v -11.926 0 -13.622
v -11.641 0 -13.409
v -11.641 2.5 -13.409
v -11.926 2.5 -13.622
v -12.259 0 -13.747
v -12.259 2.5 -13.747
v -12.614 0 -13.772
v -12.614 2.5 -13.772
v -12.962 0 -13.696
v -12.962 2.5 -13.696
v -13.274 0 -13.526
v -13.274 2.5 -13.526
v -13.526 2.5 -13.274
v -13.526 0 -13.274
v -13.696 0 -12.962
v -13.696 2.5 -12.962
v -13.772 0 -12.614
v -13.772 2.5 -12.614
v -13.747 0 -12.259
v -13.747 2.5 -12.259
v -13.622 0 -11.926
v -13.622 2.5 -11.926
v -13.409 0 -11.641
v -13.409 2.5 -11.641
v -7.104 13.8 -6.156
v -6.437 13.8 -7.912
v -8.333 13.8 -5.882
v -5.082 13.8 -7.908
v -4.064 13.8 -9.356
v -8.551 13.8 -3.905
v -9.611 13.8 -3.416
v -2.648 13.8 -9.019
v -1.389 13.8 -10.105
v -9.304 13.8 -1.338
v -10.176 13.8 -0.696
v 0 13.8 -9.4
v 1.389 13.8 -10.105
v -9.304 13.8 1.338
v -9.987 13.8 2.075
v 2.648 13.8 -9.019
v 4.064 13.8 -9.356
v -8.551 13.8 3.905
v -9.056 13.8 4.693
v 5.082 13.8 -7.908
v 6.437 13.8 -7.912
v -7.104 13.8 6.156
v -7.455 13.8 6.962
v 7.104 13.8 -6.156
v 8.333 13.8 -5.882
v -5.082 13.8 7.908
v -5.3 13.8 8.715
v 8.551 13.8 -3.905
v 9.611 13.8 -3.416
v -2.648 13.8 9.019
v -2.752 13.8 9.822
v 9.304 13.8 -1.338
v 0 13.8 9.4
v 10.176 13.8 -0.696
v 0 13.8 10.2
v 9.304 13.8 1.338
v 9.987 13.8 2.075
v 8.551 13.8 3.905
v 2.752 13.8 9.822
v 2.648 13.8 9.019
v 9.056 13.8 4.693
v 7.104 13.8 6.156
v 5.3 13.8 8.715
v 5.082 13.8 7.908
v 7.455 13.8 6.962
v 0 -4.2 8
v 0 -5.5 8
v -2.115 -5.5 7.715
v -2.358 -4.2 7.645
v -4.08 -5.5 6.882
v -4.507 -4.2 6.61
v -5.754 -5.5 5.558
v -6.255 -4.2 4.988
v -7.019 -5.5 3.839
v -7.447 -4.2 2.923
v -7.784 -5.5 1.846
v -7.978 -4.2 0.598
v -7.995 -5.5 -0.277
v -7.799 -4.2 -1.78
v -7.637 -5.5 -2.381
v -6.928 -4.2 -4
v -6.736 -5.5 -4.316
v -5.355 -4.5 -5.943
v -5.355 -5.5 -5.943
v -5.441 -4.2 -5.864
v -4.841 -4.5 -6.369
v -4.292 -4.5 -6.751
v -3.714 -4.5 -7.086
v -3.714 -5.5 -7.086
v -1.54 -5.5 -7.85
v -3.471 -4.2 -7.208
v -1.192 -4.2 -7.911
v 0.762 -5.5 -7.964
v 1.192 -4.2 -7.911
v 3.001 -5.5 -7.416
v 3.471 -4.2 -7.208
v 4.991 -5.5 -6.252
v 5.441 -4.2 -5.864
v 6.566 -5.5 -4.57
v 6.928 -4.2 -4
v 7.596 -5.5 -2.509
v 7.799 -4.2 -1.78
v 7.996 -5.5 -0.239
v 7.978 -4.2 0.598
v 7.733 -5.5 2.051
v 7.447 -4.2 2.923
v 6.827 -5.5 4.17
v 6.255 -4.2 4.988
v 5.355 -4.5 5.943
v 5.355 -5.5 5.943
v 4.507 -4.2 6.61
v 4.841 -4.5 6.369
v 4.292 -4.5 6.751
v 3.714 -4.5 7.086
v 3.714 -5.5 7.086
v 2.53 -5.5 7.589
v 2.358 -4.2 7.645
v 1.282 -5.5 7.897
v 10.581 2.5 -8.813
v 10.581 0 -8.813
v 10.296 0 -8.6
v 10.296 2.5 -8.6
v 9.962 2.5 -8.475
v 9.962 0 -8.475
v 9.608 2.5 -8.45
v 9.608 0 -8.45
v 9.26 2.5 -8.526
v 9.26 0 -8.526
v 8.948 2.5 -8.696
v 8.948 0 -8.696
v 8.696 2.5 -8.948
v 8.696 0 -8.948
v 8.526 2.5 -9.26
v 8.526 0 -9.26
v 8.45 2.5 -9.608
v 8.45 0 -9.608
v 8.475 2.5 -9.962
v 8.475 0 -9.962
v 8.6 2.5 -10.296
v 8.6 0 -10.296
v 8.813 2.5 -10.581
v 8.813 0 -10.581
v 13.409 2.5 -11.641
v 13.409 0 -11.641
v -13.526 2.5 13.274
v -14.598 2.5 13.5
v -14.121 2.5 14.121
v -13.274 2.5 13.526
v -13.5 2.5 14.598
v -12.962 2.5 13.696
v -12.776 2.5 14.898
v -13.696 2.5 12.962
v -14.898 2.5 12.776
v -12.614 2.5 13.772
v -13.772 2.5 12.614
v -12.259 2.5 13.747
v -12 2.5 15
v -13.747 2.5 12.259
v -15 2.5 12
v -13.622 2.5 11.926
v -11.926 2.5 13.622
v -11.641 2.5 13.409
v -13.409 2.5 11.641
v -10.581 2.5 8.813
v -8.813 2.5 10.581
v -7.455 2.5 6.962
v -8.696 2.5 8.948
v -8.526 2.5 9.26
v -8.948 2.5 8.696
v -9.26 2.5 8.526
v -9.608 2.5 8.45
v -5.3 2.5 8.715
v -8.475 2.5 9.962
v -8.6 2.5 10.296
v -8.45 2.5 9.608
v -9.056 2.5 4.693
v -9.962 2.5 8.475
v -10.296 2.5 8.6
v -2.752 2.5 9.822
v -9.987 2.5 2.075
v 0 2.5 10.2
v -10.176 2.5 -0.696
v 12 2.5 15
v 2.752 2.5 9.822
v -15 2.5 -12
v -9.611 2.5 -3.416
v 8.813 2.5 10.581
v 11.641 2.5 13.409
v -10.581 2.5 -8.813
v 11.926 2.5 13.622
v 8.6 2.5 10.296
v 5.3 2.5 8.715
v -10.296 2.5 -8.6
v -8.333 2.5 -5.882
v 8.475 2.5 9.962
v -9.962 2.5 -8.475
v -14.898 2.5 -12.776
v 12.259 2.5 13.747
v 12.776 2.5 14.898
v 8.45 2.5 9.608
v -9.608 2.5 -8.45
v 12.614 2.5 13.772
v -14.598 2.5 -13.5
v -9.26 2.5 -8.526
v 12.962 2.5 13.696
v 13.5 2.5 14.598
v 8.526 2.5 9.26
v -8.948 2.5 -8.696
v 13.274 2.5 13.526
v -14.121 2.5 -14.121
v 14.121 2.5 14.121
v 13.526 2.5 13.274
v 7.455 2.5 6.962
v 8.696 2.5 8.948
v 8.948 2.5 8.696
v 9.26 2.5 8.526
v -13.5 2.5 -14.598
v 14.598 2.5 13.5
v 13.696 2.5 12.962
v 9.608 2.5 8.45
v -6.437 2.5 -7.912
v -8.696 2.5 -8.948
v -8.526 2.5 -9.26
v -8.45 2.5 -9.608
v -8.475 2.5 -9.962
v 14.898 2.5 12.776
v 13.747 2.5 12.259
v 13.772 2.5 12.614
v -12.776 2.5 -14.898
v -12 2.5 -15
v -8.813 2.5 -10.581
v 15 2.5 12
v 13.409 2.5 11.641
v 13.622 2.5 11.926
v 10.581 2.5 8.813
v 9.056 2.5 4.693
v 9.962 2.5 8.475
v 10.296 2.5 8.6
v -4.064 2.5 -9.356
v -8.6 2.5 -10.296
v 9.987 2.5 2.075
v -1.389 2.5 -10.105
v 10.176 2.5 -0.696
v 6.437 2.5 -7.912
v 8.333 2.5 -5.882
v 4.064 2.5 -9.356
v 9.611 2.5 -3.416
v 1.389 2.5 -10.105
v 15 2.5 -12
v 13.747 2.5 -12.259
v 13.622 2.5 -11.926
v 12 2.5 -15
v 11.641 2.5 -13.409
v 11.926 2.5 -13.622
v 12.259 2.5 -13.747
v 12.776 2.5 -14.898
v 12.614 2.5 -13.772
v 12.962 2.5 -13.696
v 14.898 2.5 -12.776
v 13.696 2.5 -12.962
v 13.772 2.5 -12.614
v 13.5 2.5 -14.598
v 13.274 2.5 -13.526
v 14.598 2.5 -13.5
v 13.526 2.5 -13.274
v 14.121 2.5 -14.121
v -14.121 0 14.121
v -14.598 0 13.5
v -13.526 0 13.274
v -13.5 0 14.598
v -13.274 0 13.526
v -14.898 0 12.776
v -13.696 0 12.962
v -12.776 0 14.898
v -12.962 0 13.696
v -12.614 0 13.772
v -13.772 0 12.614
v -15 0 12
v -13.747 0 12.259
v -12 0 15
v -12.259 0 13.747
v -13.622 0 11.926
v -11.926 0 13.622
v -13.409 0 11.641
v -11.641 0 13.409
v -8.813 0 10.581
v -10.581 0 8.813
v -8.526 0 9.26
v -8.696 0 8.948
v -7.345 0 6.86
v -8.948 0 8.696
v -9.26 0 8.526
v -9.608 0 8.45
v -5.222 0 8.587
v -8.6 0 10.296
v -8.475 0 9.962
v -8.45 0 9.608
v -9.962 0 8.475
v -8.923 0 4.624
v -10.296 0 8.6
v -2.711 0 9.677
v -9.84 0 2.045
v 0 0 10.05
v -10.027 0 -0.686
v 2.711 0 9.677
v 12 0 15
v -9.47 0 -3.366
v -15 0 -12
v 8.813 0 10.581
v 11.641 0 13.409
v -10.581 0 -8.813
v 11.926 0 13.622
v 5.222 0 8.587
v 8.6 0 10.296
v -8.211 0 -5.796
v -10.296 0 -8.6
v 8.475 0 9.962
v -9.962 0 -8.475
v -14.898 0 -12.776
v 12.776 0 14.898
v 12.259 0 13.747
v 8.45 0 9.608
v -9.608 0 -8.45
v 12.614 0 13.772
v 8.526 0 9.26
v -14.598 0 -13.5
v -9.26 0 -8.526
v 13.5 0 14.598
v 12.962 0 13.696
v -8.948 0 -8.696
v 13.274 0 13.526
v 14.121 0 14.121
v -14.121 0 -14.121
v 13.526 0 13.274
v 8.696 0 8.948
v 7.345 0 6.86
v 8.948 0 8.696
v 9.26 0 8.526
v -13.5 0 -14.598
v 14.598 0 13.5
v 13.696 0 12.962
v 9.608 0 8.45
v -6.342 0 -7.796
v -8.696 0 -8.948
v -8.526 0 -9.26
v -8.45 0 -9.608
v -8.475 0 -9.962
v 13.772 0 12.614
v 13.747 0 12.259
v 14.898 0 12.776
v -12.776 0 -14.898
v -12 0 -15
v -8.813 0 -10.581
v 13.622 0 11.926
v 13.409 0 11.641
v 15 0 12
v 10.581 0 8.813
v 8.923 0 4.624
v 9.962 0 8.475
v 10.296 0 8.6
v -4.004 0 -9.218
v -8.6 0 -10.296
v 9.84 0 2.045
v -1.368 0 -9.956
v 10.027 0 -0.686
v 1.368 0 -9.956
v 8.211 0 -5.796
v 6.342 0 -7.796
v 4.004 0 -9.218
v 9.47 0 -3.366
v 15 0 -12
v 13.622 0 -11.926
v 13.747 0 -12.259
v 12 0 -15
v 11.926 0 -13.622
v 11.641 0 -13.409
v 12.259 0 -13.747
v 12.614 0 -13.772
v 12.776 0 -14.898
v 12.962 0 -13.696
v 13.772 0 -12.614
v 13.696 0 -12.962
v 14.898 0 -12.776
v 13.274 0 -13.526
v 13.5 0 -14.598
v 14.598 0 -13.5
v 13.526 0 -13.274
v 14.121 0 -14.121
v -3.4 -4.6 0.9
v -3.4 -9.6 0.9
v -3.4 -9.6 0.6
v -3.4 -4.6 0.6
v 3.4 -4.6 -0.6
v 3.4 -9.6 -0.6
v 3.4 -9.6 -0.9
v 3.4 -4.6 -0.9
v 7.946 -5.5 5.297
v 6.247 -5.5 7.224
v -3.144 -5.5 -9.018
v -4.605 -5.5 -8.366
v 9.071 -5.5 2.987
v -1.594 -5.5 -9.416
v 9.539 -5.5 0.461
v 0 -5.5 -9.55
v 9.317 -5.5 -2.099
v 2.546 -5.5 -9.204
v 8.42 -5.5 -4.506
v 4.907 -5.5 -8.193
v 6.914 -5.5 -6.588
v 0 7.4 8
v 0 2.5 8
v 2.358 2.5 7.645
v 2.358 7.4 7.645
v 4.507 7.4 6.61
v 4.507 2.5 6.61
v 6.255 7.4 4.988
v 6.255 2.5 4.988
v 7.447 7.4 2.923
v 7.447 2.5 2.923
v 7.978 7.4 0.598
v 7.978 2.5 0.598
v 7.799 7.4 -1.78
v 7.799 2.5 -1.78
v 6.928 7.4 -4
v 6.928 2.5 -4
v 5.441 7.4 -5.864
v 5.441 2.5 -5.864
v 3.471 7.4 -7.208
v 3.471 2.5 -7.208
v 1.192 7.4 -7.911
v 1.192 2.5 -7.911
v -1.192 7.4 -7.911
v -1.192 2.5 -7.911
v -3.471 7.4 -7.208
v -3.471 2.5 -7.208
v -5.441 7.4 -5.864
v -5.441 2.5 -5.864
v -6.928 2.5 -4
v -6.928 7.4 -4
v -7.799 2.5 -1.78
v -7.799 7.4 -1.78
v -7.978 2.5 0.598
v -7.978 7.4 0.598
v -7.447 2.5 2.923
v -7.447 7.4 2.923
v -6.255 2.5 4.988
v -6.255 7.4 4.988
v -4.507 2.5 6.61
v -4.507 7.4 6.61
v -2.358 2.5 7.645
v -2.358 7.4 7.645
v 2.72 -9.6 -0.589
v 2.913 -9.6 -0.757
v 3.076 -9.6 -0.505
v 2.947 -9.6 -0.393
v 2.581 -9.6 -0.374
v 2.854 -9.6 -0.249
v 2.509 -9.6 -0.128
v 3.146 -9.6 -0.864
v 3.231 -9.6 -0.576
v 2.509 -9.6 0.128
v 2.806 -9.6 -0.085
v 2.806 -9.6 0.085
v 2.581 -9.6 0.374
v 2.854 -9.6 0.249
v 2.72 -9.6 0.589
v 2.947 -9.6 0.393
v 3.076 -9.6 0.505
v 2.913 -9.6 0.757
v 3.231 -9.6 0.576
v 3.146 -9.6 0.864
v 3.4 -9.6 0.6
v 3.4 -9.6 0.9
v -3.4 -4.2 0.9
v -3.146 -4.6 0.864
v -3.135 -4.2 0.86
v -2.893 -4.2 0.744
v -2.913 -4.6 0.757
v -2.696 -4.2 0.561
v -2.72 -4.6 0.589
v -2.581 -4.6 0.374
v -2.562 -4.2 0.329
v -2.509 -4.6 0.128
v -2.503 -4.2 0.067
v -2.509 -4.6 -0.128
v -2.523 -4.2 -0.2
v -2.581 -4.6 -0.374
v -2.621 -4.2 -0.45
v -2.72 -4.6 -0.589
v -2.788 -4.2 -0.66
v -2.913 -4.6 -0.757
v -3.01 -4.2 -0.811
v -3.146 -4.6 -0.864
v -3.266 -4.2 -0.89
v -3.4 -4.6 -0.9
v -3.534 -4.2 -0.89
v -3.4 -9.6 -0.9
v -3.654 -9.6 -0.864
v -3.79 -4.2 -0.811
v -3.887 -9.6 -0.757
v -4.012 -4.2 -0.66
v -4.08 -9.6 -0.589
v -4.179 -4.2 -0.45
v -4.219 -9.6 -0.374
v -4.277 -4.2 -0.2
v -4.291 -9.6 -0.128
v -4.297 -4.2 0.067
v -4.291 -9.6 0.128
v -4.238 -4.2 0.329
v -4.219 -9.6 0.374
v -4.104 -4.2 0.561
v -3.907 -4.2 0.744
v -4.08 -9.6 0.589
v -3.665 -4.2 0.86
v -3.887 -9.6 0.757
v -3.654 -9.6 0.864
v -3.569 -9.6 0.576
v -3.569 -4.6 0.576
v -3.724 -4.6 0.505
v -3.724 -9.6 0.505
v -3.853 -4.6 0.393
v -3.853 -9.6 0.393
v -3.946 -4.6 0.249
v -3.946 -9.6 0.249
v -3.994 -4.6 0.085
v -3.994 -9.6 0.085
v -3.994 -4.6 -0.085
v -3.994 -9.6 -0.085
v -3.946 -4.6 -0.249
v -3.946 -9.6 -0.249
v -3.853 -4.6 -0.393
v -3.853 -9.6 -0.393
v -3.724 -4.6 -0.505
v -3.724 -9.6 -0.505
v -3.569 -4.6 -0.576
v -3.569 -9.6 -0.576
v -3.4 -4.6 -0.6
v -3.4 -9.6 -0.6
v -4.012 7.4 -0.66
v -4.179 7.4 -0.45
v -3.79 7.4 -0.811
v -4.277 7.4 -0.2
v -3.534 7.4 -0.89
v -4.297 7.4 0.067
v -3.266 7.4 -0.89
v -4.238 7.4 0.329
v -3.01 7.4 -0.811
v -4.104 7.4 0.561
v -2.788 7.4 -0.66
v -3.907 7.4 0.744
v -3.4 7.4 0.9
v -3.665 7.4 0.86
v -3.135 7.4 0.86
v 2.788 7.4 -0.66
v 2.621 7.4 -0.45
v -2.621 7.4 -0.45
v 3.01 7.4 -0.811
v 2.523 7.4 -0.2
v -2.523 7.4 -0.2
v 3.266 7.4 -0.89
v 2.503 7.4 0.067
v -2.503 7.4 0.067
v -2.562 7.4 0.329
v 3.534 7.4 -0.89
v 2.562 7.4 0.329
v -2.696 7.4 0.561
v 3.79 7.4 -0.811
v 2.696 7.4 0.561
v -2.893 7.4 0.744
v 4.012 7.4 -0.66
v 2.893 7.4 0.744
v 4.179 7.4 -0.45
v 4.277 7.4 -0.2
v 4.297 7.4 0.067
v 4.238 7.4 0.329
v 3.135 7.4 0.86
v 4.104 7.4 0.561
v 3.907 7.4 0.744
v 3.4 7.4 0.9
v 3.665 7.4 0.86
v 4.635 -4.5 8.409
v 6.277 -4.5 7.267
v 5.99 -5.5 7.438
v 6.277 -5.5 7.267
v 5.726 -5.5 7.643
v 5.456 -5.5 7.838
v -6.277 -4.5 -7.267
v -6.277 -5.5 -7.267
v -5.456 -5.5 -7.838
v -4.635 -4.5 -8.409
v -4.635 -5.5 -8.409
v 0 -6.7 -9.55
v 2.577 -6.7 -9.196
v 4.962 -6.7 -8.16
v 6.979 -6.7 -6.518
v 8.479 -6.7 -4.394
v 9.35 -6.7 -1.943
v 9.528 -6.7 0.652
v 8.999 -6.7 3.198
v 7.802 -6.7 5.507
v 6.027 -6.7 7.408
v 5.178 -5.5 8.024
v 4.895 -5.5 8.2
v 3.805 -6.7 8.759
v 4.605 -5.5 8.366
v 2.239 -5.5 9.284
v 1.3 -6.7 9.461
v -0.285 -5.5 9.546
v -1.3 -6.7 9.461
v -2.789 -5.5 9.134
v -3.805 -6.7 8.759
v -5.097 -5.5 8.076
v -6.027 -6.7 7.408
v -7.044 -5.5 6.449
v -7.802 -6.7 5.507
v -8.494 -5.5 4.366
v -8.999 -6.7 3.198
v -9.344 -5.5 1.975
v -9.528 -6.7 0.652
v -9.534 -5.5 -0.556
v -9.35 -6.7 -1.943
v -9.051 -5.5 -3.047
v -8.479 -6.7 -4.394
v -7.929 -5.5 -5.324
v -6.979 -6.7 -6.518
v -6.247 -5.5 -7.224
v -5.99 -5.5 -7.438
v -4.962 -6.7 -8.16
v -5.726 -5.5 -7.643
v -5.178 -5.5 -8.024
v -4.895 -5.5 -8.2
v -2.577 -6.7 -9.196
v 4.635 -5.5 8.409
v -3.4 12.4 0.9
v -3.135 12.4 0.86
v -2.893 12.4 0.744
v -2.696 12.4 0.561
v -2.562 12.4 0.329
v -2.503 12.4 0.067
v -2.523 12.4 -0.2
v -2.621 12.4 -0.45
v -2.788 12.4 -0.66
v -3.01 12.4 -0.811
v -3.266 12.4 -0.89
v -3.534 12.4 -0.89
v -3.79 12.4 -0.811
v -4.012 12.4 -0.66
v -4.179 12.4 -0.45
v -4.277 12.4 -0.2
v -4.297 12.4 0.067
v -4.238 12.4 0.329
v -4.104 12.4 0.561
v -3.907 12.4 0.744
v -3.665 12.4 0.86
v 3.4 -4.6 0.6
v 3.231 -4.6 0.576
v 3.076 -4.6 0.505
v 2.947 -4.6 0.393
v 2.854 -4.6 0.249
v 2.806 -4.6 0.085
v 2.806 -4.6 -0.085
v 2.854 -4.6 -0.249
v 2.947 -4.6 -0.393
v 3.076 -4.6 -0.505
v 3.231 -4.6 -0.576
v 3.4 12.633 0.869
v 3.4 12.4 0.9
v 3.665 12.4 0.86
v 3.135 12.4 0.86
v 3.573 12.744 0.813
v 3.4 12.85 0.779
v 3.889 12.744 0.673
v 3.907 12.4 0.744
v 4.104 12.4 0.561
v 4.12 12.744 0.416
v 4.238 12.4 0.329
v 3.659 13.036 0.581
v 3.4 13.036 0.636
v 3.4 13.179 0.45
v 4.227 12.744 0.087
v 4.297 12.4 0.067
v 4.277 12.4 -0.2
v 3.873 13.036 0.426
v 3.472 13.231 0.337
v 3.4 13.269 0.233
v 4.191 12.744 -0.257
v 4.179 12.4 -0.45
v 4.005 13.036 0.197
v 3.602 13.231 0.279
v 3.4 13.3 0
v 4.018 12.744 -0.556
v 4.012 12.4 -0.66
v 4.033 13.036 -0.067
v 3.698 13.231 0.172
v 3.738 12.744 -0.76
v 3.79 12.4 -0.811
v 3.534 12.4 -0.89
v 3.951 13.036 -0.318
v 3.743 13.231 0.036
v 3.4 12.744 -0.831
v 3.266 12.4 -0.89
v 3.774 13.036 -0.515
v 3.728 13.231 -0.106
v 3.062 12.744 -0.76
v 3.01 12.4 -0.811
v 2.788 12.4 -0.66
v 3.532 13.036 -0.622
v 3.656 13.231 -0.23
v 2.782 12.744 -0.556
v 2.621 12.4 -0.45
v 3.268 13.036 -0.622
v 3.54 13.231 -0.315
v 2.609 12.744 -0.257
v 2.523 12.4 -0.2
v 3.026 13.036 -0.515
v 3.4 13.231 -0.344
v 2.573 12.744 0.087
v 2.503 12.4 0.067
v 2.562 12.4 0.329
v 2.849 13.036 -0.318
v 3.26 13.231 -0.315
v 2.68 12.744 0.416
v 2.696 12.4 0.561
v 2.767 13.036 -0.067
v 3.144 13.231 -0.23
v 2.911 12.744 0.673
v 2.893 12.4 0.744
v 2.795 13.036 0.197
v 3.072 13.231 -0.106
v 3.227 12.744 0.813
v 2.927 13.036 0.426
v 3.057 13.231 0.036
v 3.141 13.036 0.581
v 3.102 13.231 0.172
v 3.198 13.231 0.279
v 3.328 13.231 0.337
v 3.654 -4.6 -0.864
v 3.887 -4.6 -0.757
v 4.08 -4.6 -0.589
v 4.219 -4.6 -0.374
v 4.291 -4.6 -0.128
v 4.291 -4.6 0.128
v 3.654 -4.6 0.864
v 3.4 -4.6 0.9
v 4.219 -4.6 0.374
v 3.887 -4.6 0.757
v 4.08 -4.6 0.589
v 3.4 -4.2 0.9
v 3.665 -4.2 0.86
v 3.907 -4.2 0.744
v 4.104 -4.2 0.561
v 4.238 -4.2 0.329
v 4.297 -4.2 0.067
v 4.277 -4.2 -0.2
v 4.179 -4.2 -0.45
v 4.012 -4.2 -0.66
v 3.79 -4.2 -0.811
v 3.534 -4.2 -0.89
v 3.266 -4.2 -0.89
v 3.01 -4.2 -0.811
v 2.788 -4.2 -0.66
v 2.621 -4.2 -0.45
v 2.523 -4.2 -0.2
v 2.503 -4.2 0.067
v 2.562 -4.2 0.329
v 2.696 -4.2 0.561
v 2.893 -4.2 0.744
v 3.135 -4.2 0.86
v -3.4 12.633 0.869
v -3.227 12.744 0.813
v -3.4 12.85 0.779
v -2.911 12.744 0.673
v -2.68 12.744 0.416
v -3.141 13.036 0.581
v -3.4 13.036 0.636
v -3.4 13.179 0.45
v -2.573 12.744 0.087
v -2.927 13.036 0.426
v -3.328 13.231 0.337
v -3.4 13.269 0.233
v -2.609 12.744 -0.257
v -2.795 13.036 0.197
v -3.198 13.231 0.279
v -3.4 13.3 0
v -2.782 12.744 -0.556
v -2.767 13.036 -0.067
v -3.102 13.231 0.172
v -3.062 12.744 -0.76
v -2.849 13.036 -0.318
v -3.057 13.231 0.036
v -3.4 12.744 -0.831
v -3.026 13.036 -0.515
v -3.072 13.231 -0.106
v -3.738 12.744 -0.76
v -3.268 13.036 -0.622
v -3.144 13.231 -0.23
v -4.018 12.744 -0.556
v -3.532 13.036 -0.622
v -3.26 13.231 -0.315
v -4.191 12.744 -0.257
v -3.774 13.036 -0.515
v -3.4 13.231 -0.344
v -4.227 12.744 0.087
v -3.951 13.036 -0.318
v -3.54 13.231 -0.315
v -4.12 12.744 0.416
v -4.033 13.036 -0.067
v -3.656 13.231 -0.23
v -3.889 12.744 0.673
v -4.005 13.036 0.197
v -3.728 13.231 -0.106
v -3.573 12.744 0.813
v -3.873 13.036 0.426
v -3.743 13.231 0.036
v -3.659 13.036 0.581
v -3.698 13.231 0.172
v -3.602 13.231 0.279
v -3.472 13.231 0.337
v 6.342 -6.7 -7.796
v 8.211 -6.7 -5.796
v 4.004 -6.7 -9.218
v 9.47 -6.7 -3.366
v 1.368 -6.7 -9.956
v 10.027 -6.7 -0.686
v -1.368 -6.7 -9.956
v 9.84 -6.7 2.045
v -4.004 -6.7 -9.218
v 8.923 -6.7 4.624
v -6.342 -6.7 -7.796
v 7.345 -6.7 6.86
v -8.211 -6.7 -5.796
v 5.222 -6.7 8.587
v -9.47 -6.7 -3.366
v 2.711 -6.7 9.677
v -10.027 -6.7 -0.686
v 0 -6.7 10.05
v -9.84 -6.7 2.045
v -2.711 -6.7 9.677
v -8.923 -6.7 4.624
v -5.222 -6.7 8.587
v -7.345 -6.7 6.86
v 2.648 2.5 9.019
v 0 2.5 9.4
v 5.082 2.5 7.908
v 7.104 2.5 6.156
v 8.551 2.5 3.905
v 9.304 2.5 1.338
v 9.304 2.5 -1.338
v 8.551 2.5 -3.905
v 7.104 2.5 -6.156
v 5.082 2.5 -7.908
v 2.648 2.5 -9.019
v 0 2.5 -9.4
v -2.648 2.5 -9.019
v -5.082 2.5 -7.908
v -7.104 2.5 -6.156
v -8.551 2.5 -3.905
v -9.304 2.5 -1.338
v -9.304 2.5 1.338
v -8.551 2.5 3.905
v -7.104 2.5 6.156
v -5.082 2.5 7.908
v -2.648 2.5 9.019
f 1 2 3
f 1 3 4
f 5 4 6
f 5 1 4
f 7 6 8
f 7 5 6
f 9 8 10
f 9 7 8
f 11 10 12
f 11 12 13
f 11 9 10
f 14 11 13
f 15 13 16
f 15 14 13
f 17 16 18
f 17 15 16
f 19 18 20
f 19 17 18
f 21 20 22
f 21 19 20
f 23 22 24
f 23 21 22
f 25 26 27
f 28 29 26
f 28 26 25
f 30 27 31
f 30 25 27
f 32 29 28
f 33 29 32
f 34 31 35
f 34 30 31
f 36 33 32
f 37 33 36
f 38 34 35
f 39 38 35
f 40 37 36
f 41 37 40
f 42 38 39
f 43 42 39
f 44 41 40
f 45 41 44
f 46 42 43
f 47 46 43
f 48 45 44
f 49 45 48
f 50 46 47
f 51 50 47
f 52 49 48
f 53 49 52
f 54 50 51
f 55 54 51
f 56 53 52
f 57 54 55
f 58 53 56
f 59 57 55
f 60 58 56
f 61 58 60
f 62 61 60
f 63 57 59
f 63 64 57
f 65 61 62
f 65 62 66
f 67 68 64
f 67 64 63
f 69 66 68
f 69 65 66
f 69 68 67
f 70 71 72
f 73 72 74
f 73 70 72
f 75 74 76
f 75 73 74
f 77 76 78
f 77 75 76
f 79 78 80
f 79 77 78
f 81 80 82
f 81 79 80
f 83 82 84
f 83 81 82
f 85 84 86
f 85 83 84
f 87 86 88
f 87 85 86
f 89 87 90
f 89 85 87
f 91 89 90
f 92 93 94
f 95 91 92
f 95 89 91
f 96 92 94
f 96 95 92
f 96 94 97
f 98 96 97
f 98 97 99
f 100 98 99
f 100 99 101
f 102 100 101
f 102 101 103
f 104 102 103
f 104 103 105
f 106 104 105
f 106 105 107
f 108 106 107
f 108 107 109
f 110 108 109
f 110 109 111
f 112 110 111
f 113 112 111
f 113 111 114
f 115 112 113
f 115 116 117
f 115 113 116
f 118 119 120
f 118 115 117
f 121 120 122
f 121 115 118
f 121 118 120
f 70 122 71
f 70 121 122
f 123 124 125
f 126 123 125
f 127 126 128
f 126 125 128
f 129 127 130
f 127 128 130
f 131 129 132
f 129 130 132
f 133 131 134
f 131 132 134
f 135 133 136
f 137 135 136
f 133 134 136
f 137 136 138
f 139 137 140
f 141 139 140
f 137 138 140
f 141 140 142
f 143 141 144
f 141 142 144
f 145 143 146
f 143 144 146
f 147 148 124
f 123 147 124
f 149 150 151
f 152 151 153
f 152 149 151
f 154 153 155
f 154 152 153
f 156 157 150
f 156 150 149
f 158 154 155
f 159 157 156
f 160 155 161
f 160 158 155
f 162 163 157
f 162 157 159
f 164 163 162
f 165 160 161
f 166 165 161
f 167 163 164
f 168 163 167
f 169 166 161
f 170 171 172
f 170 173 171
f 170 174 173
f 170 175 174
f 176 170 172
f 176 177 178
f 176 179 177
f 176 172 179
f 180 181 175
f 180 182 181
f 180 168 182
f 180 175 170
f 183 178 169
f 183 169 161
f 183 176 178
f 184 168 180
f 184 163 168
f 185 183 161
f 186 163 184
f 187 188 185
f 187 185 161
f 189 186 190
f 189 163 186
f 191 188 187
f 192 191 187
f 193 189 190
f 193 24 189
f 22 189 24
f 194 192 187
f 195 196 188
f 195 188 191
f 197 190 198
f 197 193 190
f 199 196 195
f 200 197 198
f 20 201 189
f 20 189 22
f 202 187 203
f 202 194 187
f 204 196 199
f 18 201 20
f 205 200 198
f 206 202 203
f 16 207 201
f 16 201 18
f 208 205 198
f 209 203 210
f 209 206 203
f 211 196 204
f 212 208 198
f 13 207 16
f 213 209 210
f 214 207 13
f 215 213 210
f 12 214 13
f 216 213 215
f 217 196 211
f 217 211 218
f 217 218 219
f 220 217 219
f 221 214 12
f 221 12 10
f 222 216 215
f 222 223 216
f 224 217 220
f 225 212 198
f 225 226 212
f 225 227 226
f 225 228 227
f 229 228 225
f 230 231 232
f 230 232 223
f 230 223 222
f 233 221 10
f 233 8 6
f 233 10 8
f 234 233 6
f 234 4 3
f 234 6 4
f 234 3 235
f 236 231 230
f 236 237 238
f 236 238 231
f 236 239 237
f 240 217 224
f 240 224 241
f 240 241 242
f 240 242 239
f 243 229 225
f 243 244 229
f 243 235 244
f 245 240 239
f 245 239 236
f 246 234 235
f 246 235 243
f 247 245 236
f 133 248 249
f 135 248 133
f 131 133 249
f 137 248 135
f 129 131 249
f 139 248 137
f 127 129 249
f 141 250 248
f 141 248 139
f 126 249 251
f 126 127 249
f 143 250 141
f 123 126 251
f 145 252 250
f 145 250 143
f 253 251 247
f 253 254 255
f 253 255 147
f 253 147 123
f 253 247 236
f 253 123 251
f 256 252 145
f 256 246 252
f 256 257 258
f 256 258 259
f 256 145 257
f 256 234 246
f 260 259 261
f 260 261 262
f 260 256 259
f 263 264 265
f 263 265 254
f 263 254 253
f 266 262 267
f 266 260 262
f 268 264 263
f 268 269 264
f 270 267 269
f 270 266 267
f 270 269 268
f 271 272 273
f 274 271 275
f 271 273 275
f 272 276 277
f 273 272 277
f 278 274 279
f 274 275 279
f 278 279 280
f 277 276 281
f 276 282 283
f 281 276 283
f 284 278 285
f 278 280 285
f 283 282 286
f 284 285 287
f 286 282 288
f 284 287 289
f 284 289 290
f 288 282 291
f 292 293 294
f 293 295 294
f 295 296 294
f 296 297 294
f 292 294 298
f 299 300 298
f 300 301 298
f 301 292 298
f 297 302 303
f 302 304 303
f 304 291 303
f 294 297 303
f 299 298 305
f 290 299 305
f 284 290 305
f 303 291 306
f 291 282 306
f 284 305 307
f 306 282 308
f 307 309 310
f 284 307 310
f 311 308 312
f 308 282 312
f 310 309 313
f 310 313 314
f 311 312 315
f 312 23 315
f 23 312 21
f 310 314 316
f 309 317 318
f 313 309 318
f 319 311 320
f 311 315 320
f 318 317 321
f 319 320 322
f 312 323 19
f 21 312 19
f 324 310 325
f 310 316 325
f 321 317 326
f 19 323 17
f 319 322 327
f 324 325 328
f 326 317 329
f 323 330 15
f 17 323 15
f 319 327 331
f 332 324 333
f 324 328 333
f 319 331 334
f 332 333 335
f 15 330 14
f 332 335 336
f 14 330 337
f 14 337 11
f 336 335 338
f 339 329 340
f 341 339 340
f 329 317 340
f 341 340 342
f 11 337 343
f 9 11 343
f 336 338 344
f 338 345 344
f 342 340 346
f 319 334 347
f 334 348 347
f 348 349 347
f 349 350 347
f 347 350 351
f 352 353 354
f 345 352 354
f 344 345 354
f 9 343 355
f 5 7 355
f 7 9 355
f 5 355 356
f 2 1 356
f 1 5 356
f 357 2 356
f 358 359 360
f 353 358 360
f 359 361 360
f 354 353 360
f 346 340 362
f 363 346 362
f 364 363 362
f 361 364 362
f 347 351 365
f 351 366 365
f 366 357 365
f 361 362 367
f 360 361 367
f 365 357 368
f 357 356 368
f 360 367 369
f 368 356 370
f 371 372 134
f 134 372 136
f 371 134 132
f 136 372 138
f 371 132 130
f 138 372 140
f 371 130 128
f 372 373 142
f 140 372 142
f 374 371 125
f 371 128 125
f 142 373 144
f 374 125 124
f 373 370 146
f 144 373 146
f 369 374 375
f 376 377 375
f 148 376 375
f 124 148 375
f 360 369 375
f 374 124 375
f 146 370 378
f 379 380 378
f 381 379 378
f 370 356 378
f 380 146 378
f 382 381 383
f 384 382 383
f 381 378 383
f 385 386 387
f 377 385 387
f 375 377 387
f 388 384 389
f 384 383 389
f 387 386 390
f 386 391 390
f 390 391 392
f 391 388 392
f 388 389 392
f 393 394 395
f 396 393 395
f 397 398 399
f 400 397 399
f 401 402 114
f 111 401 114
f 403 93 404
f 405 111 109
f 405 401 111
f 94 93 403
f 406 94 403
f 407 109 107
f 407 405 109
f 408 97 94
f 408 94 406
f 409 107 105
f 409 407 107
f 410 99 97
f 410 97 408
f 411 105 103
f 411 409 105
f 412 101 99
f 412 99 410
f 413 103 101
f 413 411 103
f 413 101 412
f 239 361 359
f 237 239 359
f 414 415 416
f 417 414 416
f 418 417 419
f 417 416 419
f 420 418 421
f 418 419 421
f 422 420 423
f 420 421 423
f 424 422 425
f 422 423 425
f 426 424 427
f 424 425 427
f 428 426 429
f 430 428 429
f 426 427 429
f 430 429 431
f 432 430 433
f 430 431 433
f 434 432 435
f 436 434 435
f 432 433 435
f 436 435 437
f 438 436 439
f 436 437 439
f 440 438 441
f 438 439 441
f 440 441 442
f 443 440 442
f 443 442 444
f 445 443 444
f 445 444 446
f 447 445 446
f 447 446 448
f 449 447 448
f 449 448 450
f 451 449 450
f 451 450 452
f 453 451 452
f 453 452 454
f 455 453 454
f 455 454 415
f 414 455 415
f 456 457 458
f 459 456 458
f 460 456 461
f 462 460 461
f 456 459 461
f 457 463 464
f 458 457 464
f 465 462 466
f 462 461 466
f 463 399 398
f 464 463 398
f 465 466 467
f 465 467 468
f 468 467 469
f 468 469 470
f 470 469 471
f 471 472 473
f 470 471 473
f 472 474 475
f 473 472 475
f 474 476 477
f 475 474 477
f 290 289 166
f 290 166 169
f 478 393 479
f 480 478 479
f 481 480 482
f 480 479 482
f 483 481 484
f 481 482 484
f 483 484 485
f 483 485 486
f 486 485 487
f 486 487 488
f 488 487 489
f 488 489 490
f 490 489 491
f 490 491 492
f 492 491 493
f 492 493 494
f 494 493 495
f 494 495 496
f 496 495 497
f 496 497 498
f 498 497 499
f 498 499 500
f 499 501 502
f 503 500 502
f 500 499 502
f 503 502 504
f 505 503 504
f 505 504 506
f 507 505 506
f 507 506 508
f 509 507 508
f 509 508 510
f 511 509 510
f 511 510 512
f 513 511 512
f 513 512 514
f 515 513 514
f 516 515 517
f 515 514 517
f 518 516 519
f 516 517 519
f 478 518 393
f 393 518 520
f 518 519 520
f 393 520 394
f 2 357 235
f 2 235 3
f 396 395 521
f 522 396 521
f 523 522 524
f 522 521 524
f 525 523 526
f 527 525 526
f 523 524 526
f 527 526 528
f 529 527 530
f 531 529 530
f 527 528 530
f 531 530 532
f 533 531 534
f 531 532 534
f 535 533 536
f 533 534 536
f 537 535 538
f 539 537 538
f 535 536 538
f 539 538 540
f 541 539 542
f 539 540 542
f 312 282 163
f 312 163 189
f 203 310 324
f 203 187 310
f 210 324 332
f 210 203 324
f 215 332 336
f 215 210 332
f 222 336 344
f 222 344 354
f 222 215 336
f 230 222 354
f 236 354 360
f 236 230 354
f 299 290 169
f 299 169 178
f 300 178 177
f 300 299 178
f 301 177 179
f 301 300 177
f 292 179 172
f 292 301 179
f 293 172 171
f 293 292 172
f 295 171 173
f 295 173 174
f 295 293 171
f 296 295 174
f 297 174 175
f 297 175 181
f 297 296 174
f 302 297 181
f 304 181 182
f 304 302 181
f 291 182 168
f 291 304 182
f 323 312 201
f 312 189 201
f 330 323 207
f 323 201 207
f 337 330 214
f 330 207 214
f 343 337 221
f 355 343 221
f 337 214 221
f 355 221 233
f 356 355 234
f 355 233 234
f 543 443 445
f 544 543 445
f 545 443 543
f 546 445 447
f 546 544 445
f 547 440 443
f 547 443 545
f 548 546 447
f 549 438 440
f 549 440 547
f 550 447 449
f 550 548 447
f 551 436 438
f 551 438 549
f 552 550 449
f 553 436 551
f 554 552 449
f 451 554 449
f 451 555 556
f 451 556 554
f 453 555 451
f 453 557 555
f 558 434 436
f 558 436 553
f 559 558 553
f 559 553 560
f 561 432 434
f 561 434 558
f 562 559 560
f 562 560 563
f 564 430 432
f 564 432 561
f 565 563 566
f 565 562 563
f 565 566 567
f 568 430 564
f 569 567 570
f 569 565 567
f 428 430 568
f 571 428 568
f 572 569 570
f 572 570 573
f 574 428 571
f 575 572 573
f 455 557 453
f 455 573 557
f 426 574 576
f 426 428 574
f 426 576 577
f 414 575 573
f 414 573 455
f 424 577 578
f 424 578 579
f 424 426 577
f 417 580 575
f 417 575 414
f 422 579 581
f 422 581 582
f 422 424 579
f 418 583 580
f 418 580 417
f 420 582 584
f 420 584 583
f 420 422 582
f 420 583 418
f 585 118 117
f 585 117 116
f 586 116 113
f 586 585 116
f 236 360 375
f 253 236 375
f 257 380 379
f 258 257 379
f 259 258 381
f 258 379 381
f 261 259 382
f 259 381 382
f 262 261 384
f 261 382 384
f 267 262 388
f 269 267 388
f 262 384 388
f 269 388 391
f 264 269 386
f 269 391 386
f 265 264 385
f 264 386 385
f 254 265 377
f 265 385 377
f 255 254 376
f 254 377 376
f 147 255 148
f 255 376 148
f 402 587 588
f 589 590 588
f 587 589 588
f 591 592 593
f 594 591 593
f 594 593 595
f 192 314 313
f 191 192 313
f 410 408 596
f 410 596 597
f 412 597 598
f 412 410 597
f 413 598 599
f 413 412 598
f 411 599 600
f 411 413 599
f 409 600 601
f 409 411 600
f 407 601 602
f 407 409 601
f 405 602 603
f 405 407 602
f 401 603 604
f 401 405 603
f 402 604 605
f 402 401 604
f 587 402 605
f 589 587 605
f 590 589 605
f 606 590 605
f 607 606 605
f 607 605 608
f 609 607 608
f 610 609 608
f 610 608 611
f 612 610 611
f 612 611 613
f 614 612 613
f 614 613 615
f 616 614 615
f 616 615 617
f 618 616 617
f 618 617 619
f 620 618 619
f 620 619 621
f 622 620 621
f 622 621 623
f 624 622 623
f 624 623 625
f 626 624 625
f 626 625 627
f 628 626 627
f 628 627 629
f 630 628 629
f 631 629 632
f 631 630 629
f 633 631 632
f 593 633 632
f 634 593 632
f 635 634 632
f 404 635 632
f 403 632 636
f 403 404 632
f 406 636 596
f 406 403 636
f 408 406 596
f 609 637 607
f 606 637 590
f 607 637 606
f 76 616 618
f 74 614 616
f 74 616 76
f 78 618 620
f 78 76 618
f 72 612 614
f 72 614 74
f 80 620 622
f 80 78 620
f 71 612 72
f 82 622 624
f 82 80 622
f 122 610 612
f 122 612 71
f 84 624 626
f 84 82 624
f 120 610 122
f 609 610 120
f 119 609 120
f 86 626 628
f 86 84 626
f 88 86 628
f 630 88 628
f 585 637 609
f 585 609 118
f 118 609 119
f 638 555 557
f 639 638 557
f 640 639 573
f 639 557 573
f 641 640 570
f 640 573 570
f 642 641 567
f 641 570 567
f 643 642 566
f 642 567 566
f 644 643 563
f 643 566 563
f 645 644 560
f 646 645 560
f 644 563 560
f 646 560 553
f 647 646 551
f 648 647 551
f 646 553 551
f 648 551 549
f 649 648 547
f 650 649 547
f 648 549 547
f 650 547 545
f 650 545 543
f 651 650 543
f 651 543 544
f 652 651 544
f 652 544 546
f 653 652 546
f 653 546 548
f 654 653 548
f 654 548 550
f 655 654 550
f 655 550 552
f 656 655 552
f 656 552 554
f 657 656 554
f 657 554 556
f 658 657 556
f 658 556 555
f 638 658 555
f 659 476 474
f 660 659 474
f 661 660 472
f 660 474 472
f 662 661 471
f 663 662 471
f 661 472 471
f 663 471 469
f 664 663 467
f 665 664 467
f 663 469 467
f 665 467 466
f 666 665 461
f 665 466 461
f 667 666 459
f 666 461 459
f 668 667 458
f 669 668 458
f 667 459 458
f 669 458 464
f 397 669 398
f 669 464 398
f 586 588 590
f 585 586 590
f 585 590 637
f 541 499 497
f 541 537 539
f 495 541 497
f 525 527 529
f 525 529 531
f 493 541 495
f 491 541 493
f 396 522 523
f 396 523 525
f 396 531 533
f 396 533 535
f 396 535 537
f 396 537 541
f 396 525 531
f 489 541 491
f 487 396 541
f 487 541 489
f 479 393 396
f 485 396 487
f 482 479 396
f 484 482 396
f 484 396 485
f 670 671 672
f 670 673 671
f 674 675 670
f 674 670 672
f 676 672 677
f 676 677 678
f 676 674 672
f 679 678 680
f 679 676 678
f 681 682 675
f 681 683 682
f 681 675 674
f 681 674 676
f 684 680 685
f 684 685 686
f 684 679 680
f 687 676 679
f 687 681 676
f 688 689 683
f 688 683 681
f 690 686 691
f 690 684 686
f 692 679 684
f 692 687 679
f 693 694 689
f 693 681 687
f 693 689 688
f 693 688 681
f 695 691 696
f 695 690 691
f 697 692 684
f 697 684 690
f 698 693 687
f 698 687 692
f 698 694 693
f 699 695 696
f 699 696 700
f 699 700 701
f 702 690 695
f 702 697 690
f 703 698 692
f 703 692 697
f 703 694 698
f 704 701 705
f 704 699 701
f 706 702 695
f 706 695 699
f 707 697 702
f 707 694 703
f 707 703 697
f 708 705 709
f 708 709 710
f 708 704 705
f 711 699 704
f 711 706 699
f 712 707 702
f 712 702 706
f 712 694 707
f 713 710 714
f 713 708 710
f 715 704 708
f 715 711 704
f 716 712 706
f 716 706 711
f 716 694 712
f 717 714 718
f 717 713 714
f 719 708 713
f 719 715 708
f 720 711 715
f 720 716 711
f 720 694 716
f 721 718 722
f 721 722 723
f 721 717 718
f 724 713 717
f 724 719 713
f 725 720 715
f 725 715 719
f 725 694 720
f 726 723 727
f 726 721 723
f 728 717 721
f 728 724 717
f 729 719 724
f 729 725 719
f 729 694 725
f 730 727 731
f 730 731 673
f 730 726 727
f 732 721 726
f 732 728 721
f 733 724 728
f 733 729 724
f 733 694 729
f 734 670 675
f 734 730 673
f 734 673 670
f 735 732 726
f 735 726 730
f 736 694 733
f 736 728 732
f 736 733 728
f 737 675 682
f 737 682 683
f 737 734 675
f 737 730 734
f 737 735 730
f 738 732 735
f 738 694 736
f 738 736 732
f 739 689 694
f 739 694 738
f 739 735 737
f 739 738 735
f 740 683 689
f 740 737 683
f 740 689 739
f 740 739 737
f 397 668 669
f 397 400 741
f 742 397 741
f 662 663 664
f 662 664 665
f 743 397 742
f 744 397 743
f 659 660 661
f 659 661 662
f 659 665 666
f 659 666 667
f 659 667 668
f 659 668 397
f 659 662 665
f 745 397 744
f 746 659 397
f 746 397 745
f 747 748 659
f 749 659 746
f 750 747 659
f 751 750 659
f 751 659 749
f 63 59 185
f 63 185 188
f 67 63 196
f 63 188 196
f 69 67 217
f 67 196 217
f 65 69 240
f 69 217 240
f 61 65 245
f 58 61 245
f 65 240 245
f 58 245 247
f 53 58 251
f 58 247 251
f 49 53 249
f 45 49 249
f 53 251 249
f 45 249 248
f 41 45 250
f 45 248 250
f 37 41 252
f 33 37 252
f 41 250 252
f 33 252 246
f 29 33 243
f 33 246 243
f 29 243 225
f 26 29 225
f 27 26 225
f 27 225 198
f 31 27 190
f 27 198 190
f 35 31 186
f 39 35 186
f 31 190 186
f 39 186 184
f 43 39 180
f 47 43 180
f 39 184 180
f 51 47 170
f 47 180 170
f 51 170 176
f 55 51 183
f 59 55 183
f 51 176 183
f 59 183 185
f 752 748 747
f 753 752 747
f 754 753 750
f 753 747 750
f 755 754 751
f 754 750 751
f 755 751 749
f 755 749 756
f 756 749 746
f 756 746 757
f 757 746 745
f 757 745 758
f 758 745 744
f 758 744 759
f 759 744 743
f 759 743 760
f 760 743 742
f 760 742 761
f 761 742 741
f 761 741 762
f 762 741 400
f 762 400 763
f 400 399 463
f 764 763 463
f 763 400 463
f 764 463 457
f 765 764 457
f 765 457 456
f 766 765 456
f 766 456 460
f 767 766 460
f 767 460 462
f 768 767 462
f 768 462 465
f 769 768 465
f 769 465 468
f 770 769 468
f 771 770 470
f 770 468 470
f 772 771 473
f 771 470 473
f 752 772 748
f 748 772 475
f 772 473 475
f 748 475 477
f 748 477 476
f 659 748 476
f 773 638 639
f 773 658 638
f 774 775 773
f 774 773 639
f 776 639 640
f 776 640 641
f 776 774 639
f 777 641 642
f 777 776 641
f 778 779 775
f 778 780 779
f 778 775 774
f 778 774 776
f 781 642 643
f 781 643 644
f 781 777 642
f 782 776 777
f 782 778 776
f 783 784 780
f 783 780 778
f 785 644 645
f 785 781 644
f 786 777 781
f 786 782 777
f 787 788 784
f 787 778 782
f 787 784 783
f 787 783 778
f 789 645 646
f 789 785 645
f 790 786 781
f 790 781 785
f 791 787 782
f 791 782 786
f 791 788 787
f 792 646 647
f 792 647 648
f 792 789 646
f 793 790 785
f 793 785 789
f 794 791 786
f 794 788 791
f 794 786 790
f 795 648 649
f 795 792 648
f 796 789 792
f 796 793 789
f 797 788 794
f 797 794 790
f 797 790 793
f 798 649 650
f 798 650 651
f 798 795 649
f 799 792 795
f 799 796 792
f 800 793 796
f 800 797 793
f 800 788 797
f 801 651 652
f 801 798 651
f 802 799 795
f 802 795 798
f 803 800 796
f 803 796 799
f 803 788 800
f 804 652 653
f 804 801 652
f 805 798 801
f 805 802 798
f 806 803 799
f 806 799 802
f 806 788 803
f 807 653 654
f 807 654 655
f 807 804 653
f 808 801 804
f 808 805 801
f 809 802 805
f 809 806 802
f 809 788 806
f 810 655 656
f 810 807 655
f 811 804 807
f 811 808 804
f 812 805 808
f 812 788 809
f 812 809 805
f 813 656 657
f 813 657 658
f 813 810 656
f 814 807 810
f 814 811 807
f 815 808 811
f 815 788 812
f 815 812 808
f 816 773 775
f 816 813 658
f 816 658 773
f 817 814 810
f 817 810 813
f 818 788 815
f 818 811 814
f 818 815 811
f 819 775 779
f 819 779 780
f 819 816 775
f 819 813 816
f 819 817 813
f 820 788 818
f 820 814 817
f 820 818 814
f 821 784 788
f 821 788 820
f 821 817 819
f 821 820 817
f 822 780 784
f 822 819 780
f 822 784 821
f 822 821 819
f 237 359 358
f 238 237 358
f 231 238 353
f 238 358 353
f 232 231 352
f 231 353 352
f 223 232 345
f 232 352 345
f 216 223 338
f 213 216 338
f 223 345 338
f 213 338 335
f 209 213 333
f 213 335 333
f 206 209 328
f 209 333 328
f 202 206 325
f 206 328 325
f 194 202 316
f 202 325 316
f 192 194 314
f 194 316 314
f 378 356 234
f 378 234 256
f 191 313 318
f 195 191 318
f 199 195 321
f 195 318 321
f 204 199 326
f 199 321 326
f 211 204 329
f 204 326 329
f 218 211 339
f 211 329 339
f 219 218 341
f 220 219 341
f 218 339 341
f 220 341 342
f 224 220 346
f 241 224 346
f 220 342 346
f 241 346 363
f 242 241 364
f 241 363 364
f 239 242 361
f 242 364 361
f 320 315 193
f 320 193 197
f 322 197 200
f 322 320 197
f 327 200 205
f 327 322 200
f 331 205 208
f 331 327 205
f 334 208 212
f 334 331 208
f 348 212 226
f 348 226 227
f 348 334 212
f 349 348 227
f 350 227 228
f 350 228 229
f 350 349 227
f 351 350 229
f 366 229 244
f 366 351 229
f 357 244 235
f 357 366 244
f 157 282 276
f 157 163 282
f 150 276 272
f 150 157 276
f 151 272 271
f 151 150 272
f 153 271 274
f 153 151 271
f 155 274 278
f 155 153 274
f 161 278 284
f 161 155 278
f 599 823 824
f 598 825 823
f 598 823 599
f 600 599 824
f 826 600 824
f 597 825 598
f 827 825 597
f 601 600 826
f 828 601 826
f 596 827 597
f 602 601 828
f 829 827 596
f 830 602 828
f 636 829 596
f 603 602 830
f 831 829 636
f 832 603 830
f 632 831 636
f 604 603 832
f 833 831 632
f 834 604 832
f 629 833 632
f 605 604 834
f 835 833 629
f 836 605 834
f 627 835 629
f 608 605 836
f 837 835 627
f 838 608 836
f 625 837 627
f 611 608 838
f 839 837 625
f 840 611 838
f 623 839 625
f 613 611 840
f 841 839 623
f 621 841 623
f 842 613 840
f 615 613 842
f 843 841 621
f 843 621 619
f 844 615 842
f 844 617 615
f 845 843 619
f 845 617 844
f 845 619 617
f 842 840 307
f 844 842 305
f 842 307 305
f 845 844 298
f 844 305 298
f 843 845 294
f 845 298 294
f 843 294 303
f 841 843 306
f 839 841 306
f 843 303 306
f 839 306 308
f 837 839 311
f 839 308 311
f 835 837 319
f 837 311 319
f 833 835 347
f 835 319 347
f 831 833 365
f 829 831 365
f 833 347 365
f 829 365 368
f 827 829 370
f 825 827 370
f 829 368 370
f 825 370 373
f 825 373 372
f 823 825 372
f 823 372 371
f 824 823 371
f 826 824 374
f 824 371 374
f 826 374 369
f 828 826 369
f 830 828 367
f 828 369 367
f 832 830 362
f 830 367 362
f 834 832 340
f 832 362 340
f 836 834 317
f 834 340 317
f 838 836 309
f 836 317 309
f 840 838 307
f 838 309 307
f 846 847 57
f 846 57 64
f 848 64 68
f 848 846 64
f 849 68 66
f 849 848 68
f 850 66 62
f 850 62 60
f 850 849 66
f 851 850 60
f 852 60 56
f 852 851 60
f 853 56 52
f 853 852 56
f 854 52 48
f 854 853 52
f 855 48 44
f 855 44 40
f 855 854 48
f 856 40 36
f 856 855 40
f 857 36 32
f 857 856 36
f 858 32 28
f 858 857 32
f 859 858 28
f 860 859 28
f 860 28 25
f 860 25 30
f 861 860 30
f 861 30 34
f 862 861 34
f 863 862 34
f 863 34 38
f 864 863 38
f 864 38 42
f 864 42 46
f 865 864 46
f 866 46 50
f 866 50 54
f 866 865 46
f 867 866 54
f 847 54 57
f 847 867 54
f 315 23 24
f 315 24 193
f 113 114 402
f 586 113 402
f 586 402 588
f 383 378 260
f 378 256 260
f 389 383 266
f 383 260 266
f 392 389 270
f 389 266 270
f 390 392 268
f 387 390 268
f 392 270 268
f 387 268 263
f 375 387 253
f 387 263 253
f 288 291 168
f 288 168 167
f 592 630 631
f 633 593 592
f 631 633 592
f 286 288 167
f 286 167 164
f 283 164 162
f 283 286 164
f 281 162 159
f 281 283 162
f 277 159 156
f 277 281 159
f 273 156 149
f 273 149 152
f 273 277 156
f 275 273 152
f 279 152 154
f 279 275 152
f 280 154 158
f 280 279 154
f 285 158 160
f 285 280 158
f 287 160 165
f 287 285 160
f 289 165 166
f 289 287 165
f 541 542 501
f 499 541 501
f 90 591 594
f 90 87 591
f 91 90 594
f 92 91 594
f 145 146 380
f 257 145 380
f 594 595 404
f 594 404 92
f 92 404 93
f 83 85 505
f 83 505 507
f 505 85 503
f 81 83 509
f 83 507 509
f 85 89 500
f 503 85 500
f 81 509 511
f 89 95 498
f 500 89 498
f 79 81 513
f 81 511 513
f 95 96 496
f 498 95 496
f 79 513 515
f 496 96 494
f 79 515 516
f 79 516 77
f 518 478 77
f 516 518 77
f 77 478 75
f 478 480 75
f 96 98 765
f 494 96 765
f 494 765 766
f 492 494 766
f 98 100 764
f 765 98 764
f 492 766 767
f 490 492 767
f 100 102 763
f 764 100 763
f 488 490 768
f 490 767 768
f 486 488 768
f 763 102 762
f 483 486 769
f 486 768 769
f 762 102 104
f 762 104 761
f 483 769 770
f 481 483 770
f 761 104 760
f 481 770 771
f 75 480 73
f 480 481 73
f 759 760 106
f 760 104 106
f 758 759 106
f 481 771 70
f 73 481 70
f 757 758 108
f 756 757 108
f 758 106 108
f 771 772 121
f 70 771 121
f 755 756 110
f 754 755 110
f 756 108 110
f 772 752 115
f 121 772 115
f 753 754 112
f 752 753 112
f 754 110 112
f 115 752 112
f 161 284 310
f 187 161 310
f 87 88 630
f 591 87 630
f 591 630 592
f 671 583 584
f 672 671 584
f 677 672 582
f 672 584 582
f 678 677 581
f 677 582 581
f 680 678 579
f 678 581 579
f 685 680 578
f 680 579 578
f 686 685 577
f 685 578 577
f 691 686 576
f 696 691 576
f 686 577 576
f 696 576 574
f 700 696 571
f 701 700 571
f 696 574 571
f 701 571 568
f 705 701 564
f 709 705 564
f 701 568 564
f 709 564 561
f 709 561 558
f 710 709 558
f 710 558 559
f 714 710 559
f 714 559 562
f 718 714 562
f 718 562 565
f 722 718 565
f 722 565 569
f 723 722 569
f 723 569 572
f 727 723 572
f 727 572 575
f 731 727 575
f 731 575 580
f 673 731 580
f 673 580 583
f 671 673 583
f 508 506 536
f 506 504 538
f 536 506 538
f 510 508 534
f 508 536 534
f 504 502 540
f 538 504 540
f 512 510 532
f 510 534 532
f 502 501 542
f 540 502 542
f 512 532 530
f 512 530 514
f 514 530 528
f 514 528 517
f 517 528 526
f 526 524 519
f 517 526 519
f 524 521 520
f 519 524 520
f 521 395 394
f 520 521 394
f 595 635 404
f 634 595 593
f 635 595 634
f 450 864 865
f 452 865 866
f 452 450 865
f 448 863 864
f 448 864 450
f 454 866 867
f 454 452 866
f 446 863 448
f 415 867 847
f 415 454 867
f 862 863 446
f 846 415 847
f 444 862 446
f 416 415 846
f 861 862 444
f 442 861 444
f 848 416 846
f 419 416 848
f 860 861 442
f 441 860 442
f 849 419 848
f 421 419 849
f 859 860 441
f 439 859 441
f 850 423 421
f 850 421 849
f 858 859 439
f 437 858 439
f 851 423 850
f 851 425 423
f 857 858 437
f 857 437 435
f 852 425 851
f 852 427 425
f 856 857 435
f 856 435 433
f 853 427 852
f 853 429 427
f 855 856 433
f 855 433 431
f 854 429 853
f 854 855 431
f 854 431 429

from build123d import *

# Parameters (mm, degrees)
SKETCH1_W           = 30
SKETCH1_H           = 30
EXTRUDE1_DEPTH      = 2.5
FILLET2_R           = 3
SKETCH3_R           = 10.2
SKETCH3_R_2         = 9.4
EXTRUDE2_DEPTH      = 11.3
EXTRUDE3_DEPTH      = 4.9
EXTRUDE3_DEPTH_BACK = 6.7
SKETCH4_R           = 8
EXTRUDE4_DEPTH      = 5.9
EXTRUDE4_DEPTH_BACK = 17
SKETCH5_R           = 0.9
FILLET3_R           = 0.9
SKETCH6_R           = 10.05
SKETCH6_R_2         = 9.55
EXTRUDE5_DEPTH      = 6.7
CUT_EXTRUDE1_DEPTH  = 5
SKETCH8_R           = 9.55
SKETCH8_R_2         = 8
EXTRUDE7_DEPTH      = 5.5
CUT_EXTRUDE2_DEPTH  = 1


with BuildPart() as part:
    # Sketch1 → Extrude1 (new body)
    with BuildSketch(Plane(origin=(0, 0, 0), x_dir=(1, 0, 0), z_dir=(0, 1, 0))):
        Rectangle(SKETCH1_W, SKETCH1_H)
        with BuildLine():
            Line((13.409009742, 11.641242789), (10.580582618, 8.812815665))
            ThreePointArc((10.580582618, 8.812815665), (8.812815665, 8.812815665), (8.812815665, 10.580582618))
            Line((8.812815665, 10.580582618), (11.641242789, 13.409009742))
            ThreePointArc((11.641242789, 13.409009742), (13.409009742, 13.409009742), (13.409009742, 11.641242789))
        make_face(mode=Mode.SUBTRACT)
        with BuildLine():
            Line((-13.409009742, 11.641242789), (-10.580582618, 8.812815665))
            ThreePointArc((-10.580582618, 8.812815665), (-8.812815665, 8.812815665), (-8.812815665, 10.580582618))
            Line((-8.812815665, 10.580582618), (-11.641242789, 13.409009742))
            ThreePointArc((-11.641242789, 13.409009742), (-13.409009742, 13.409009742), (-13.409009742, 11.641242789))
        make_face(mode=Mode.SUBTRACT)
        with BuildLine():
            Line((-11.641242789, -13.409009742), (-8.812815665, -10.580582618))
            ThreePointArc((-8.812815665, -10.580582618), (-8.812815665, -8.812815665), (-10.580582618, -8.812815665))
            Line((-10.580582618, -8.812815665), (-13.409009742, -11.641242789))
            ThreePointArc((-13.409009742, -11.641242789), (-13.409009742, -13.409009742), (-11.641242789, -13.409009742))
        make_face(mode=Mode.SUBTRACT)
        with BuildLine():
            Line((11.641242789, -13.409009742), (8.812815665, -10.580582618))
            ThreePointArc((8.812815665, -10.580582618), (8.812815665, -8.812815665), (10.580582618, -8.812815665))
            Line((10.580582618, -8.812815665), (13.409009742, -11.641242789))
            ThreePointArc((13.409009742, -11.641242789), (13.409009742, -13.409009742), (11.641242789, -13.409009742))
        make_face(mode=Mode.SUBTRACT)
    extrude(amount=EXTRUDE1_DEPTH)

    # Fillet2
    fillet2_edges = [part.edges().sort_by_distance(p)[0] for p in [
        (15, 1.25, 15),
        (-15, 1.25, 15),
        (-15, 1.25, -15),
        (15, 1.25, -15),
    ]]
    fillet(fillet2_edges, radius=FILLET2_R)

    # Sketch3 → Extrude2 (add)
    with BuildSketch(Plane(origin=(0, 2.5, 0), x_dir=(1, 0, 0), z_dir=(0, 1, 0))):
        with Locations(Location((0, 0, 0), (0, 0, 270))):
            Circle(SKETCH3_R)
        with Locations(Location((0, 0, 0), (0, 0, 270))):
            Circle(SKETCH3_R_2, mode=Mode.SUBTRACT)
    extrude(amount=EXTRUDE2_DEPTH)

    # Sketch4 → Extrude3 (add, two sides: drawn at the far end of the back side and taken through both)
    with BuildSketch(Plane(origin=(0, 2.5, 0), x_dir=(1, 0, 0), z_dir=(0, 1, 0)).offset(-EXTRUDE3_DEPTH_BACK)):
        with Locations(Location((0, 0, 0), (0, 0, 270))):
            Circle(SKETCH4_R)
    extrude(amount=EXTRUDE3_DEPTH + EXTRUDE3_DEPTH_BACK)

    # Sketch5 → Extrude4 (add, two sides: drawn at the far end of the back side and taken through both)
    with BuildSketch(Plane(origin=(0, 7.4, 0), x_dir=(1, 0, 0), z_dir=(0, 1, 0)).offset(-EXTRUDE4_DEPTH_BACK)):
        with Locations(Location((3.4, 0, 0), (0, 0, 270))):
            Circle(SKETCH5_R)
        with Locations(Location((-3.4, 0, 0), (0, 0, 270))):
            Circle(SKETCH5_R)
    extrude(amount=EXTRUDE4_DEPTH + EXTRUDE4_DEPTH_BACK)

    # Fillet3
    fillet3_edges = [part.edges().sort_by_distance(p)[0] for p in [
        (3.4, 13.3, -0.9),
        (-3.4, 13.3, -0.9),
    ]]
    fillet(fillet3_edges, radius=FILLET3_R)

    # Sketch6 → Extrude5 (add)
    with BuildSketch(Plane.XZ):
        with Locations(Location((0, 0, 0), (0, 0, 90))):
            Circle(SKETCH6_R)
        with Locations(Location((0, 0, 0), (0, 0, 270))):
            Circle(SKETCH6_R_2, mode=Mode.SUBTRACT)
    extrude(amount=EXTRUDE5_DEPTH)

    # Sketch7 → Cut-Extrude1 (cut)
    with BuildSketch(Plane.XZ.offset(9.6)):
        with BuildLine():
            Line((3.4, 0.9), (3.4, 0.6))
            ThreePointArc((3.4, 0.6), (2.8, 0), (3.4, -0.6))
            Line((3.4, -0.6), (3.4, -0.9))
            ThreePointArc((3.4, -0.9), (4.3, 0), (3.4, 0.9))
        make_face()
        with BuildLine():
            Line((-3.4, -0.6), (-3.4, -0.9))
            ThreePointArc((-3.4, -0.9), (-2.5, 0), (-3.4, 0.9))
            Line((-3.4, 0.9), (-3.4, 0.6))
            ThreePointArc((-3.4, 0.6), (-4, 0), (-3.4, -0.6))
        make_face()
    extrude(amount=-CUT_EXTRUDE1_DEPTH, mode=Mode.SUBTRACT)

    # Sketch8 → Extrude7 (add)
    with BuildSketch(Plane.XZ):
        with Locations(Location((0, 0, 0), (0, 0, 270))):
            Circle(SKETCH8_R)
        with Locations(Location((0, 0, 0), (0, 0, 90))):
            Circle(SKETCH8_R_2, mode=Mode.SUBTRACT)
    extrude(amount=EXTRUDE7_DEPTH)

    # Sketch9 → Cut-Extrude2 (cut)
    with BuildSketch(Plane.XZ.offset(5.5)):
        Polygon((-4.635007145, -8.409471372), (6.276512407, 7.26690388), (4.635007145, 8.409471372), (-6.276512407, -7.26690388), align=None)
    extrude(amount=-CUT_EXTRUDE2_DEPTH, mode=Mode.SUBTRACT)


solid = part.part
